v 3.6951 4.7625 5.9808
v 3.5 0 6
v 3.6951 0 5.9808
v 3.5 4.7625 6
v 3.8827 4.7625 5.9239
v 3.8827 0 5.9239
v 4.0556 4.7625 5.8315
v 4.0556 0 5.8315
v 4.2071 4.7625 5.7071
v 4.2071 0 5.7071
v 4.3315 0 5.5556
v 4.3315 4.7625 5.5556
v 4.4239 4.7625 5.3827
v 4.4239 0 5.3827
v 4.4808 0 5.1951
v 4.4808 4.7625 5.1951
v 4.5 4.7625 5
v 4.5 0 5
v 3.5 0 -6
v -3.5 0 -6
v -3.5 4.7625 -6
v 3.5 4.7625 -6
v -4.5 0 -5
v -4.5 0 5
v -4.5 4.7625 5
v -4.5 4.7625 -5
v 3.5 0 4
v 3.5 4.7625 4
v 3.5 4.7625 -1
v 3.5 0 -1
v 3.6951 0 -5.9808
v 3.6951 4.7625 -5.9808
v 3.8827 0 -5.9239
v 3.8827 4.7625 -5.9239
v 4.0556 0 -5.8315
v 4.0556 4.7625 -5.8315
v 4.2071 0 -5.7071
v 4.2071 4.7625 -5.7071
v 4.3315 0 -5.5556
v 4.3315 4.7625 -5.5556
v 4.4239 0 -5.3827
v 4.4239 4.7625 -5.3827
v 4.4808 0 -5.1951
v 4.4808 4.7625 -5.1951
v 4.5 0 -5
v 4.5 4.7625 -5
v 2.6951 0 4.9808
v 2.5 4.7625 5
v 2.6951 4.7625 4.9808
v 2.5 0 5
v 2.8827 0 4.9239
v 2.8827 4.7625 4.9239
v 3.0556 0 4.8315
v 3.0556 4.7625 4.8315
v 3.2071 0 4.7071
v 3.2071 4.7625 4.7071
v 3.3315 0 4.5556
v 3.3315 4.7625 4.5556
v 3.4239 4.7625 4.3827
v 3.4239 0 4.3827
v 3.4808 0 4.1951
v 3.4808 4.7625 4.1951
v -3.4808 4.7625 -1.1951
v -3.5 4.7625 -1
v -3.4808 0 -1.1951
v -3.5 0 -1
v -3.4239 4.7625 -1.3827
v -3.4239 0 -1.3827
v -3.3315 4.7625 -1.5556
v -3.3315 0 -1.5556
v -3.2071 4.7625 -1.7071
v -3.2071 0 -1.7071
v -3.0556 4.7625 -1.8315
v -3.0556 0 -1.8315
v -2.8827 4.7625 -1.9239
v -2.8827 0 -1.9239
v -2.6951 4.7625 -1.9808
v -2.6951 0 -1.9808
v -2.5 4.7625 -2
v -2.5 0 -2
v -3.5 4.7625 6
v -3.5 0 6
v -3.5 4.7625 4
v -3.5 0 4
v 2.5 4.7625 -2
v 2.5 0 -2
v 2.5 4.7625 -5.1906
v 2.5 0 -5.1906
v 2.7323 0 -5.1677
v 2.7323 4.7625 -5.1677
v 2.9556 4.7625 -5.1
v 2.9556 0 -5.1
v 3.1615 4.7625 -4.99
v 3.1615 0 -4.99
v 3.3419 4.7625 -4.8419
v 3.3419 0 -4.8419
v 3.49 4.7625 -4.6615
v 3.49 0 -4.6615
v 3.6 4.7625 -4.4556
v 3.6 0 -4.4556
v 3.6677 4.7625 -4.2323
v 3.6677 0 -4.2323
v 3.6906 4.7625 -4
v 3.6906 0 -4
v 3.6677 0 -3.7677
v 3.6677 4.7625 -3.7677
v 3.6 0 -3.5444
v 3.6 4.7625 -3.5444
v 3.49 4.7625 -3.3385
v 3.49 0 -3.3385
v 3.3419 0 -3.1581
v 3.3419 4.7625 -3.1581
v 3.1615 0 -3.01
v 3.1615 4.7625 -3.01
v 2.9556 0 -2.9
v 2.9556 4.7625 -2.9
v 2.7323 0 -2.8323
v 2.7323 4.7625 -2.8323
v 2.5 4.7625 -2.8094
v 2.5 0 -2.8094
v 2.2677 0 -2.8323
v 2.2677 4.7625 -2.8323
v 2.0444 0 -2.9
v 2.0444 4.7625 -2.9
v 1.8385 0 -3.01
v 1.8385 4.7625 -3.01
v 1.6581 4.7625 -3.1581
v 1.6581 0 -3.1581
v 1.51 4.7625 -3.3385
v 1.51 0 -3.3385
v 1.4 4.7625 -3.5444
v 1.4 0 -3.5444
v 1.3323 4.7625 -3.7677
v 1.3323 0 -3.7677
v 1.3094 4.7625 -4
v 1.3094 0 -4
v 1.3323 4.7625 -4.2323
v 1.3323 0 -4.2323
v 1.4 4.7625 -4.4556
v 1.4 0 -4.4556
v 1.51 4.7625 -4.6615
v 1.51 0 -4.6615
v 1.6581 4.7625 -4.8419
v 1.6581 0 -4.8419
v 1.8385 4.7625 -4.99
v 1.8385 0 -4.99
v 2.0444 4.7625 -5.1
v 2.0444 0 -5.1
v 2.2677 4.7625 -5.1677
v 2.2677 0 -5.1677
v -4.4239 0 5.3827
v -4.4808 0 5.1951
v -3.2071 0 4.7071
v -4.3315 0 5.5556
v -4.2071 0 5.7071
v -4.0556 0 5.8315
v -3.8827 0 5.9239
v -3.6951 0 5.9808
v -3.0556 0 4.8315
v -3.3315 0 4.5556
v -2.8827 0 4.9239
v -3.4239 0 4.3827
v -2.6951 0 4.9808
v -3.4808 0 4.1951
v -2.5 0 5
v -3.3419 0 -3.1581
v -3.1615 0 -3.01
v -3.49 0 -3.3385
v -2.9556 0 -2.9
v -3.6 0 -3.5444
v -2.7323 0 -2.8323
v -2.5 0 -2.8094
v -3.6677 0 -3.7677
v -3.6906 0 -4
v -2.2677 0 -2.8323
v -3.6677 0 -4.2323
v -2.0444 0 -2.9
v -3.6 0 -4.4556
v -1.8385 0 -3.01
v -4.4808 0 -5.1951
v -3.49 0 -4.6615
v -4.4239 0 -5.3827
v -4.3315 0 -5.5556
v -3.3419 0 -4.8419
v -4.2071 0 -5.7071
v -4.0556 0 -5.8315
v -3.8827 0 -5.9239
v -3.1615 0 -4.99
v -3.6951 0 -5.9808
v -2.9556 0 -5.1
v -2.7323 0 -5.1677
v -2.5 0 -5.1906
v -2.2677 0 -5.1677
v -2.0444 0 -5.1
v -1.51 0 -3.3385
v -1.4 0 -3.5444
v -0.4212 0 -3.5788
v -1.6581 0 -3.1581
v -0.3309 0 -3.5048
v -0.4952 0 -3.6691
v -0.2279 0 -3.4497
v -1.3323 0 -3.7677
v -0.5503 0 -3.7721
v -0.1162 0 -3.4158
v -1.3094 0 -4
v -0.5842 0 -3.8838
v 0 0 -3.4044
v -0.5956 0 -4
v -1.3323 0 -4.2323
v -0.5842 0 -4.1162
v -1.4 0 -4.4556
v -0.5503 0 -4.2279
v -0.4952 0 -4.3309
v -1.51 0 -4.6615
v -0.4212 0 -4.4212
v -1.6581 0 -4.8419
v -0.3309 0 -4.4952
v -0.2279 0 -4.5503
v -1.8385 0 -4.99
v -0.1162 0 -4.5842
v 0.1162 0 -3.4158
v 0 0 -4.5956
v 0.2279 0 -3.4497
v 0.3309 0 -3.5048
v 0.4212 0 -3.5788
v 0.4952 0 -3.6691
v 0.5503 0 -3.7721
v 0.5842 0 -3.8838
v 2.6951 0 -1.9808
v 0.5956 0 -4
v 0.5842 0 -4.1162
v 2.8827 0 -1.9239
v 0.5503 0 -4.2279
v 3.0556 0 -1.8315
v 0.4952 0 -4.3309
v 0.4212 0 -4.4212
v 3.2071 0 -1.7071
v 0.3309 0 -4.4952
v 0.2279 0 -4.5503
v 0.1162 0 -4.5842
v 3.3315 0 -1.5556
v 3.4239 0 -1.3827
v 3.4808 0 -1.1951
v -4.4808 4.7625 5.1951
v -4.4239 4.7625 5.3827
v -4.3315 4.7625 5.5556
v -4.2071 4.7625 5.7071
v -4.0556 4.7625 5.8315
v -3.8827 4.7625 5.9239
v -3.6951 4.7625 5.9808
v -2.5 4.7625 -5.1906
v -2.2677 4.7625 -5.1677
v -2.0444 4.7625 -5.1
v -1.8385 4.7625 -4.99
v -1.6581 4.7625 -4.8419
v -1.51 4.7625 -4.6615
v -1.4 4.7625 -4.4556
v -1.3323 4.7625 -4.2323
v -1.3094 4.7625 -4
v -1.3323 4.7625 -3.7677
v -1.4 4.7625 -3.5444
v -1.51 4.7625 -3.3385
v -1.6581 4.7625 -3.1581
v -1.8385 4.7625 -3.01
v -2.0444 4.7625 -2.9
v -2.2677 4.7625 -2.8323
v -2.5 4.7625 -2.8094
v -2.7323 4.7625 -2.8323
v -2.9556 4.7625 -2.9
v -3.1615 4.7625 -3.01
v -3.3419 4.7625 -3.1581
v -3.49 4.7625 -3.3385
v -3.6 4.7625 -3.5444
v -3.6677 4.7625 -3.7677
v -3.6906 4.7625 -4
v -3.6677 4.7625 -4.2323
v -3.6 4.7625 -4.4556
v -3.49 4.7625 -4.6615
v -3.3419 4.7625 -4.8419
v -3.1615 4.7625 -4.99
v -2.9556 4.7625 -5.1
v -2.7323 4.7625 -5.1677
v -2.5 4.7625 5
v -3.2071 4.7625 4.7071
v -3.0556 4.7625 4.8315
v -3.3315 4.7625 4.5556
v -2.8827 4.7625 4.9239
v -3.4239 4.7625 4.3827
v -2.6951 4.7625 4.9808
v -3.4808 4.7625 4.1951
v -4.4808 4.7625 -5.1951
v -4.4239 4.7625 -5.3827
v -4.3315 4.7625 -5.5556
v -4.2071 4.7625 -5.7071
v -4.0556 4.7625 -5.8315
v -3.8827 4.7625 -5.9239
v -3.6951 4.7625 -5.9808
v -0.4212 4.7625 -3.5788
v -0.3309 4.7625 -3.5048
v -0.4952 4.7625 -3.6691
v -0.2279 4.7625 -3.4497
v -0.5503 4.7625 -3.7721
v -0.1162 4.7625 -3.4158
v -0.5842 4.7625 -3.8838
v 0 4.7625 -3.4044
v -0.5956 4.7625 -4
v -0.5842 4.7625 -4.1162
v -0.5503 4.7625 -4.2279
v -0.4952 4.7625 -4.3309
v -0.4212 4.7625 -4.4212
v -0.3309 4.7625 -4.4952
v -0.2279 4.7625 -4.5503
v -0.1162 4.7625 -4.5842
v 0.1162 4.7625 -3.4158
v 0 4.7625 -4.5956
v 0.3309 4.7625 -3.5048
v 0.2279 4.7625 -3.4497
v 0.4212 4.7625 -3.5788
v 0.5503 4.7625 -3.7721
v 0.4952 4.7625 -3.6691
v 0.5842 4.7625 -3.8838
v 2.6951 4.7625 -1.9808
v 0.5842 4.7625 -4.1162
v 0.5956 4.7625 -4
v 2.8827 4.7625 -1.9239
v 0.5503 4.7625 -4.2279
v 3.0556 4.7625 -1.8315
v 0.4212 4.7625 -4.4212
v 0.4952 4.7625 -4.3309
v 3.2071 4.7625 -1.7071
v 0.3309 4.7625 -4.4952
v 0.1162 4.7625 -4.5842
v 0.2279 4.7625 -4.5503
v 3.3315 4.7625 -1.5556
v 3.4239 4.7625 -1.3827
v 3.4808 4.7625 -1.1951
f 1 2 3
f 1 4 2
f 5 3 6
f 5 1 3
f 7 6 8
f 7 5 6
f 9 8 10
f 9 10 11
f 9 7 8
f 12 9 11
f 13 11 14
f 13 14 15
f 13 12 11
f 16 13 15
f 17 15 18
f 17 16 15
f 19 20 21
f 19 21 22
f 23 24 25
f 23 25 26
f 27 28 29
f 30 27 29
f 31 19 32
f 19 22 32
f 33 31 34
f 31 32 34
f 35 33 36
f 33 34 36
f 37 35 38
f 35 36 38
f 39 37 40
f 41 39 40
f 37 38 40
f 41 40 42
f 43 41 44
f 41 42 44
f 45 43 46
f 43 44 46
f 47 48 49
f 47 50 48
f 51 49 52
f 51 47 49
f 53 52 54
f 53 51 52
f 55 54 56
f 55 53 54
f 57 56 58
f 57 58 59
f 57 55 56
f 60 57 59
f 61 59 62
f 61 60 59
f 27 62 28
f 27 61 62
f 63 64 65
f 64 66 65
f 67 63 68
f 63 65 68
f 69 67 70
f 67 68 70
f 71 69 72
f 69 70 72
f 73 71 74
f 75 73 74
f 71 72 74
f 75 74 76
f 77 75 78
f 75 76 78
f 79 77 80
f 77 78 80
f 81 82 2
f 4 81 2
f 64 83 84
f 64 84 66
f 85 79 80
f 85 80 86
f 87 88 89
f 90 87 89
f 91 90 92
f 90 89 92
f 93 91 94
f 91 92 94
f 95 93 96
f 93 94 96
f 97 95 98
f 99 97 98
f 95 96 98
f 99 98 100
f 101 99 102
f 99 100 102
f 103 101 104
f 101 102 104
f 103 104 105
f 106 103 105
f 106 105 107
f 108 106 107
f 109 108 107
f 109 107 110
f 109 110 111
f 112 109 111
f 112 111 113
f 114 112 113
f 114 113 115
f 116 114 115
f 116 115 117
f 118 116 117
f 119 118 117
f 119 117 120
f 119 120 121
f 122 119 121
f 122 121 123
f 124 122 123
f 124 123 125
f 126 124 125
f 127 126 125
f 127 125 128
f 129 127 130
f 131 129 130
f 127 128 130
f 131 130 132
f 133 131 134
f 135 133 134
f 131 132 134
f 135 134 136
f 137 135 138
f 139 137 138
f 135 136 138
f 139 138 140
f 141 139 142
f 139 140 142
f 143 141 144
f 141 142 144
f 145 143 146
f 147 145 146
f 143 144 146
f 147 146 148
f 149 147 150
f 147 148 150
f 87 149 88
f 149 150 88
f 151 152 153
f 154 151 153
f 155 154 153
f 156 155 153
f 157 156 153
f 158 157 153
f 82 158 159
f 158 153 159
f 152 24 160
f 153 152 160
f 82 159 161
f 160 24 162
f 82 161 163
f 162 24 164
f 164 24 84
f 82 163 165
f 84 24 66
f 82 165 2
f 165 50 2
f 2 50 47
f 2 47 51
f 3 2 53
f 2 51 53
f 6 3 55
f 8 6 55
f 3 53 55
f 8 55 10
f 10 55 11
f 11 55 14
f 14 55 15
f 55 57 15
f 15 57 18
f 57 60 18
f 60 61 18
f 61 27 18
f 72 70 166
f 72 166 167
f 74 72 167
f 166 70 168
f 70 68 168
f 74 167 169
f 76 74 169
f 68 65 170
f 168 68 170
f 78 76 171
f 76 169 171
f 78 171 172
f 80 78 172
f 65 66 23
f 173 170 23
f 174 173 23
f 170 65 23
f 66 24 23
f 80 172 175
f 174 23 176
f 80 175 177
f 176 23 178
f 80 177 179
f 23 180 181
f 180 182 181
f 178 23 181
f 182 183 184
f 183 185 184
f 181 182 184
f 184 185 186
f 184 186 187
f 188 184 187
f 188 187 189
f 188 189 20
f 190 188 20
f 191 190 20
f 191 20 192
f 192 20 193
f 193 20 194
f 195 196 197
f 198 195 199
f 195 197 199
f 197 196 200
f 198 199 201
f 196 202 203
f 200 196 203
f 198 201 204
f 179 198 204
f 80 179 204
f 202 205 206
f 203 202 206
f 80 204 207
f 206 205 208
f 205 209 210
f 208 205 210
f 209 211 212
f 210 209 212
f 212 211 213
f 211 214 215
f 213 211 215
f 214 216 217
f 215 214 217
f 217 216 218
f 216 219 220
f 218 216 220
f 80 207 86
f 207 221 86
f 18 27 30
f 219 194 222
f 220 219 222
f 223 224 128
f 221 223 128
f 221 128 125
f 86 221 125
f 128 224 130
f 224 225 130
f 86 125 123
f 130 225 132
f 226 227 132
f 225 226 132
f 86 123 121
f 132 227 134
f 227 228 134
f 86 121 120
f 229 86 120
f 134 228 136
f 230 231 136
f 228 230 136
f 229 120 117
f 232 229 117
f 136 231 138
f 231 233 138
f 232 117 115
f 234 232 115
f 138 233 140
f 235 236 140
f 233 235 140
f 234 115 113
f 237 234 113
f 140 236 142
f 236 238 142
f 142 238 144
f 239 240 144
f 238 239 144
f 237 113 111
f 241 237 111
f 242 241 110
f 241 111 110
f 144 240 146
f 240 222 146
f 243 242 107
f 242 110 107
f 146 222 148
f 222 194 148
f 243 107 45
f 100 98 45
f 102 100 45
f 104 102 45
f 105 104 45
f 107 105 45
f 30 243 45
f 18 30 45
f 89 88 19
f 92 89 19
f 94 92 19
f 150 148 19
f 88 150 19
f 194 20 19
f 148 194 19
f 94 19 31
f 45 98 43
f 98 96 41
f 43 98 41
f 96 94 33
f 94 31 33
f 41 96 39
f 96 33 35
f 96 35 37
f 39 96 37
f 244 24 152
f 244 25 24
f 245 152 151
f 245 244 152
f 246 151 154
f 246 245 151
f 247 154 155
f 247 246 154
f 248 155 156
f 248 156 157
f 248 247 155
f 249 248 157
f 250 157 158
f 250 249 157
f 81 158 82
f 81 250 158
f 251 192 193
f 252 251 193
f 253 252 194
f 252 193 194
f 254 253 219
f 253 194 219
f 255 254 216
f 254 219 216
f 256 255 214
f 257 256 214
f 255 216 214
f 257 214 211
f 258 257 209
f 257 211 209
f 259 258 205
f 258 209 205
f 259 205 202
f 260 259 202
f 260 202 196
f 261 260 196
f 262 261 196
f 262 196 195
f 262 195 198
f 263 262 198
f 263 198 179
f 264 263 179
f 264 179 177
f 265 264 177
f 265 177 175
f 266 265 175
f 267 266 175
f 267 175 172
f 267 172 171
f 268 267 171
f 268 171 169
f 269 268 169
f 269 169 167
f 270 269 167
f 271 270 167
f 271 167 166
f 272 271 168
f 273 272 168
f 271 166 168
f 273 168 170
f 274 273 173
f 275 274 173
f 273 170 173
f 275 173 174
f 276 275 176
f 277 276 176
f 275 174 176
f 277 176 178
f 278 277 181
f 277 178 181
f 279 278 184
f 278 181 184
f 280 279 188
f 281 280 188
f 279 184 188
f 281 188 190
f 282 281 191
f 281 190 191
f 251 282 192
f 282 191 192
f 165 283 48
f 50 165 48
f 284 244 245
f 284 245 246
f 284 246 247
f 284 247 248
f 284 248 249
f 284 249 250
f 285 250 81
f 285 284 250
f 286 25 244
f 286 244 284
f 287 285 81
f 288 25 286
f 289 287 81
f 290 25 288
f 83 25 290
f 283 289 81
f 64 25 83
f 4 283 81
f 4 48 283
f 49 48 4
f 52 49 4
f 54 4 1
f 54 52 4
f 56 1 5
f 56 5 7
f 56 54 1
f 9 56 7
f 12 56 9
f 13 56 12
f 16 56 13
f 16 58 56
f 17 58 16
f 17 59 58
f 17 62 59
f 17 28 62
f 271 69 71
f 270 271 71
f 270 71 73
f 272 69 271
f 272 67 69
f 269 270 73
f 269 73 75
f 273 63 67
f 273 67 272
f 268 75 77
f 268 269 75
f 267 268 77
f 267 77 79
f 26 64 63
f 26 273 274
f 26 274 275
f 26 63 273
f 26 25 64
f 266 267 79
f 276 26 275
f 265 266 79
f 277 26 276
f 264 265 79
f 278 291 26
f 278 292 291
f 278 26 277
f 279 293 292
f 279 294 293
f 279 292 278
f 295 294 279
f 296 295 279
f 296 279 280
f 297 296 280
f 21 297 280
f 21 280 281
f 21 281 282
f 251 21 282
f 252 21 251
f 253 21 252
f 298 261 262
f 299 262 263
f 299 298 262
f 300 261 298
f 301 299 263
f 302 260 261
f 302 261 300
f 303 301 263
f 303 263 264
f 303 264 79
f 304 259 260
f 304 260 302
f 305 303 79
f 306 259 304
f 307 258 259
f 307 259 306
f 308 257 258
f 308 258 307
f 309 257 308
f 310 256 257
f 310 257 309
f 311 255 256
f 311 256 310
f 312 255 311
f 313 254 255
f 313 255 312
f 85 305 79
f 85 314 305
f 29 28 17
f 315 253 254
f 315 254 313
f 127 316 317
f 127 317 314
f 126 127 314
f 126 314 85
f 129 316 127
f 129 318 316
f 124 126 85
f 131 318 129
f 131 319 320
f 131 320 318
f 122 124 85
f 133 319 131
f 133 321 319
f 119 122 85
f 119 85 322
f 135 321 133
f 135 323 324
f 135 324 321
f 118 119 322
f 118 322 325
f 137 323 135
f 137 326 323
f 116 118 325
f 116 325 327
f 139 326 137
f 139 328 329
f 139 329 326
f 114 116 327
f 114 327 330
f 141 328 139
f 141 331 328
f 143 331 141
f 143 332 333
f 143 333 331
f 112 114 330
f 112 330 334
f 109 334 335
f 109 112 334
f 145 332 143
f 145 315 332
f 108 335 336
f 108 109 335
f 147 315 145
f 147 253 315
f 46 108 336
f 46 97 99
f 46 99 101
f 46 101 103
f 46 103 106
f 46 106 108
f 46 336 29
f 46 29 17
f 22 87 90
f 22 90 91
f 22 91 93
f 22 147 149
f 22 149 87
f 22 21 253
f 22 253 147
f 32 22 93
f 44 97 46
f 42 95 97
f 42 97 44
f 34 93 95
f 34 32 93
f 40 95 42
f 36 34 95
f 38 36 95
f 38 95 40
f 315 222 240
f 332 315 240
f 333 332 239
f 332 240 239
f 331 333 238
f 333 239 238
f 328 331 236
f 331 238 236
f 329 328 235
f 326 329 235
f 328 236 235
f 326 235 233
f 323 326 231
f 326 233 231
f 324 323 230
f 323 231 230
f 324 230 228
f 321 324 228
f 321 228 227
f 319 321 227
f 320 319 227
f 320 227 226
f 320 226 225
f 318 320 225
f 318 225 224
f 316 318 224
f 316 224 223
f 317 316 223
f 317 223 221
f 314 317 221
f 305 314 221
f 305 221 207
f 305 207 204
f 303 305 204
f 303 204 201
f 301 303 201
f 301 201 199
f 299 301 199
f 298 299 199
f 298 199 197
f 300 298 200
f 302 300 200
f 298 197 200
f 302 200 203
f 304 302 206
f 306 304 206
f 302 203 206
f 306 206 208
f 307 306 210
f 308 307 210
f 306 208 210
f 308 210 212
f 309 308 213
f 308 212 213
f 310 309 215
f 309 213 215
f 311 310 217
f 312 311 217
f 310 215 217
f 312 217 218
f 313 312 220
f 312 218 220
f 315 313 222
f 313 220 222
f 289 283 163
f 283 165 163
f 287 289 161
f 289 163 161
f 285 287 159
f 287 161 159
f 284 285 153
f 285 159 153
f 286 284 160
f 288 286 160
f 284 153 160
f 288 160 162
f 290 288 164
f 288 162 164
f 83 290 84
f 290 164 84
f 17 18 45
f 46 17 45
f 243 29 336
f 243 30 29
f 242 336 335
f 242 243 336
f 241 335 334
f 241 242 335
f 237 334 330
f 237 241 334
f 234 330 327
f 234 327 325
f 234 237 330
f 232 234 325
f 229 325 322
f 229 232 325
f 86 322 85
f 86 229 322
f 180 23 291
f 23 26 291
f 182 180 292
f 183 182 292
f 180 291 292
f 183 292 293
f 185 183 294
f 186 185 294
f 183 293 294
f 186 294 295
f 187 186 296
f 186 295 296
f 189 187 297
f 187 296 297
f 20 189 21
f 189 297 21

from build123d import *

# Parameters (mm, degrees)
SKETCH1_W                           = 9
SKETCH1_H                           = 12
EXTRUDE1_DEPTH                      = 4.7625
SKETCH2_W                           = 7
SKETCH2_H                           = 7
EXTRUDE2_DEPTH                      = 5.7625
F_0_80_TAPPED_HOLE1_D               = 1.19126
F_3_32_0_09375_DIAMETER_HOLE1_D     = 2.38125
F_3_32_0_09375_DIAMETER_HOLE1_DEPTH = 10
F_3_32_0_09375_DIAMETER_HOLE1_TIP   = 0.715399675
FILLET7_R                           = 1


with BuildPart() as part:
    # Sketch1 → Extrude1 (new body)
    with BuildSketch(Plane(origin=(0, 0, 0), x_dir=(1, 0, 0), z_dir=(0, 1, 0))):
        Rectangle(SKETCH1_W, SKETCH1_H)
    extrude(amount=EXTRUDE1_DEPTH)

    # Sketch2 → Extrude2 (cut, through all)
    with BuildSketch(Plane(origin=(0, 4.7625, 0), x_dir=(1, 0, 0), z_dir=(0, 1, 0))):
        with Locations((0, -1.5)):
            Rectangle(SKETCH2_W, SKETCH2_H)
    extrude(amount=-EXTRUDE2_DEPTH, mode=Mode.SUBTRACT)

    # #0-80 Tapped Hole1 (through all)
    with Locations(Plane(origin=(0, 4.7625, -4), x_dir=(0, 0, 1), z_dir=(0, 1, 0))):
        with Locations((0, 0)):
            Hole(F_0_80_TAPPED_HOLE1_D / 2)

    # 3/32 (0.09375) Diameter Hole1
    with Locations(Plane(origin=(-2.5, 4.7625, -4), x_dir=(0, 0, 1), z_dir=(0, 1, 0))):
        with Locations((0, 0), (0, 5)):
            Hole(F_3_32_0_09375_DIAMETER_HOLE1_D / 2, depth=F_3_32_0_09375_DIAMETER_HOLE1_DEPTH)
            with Locations((0, 0, -(F_3_32_0_09375_DIAMETER_HOLE1_DEPTH + F_3_32_0_09375_DIAMETER_HOLE1_TIP / 2))):  # 118° drill point
                Cone(0, F_3_32_0_09375_DIAMETER_HOLE1_D / 2, F_3_32_0_09375_DIAMETER_HOLE1_TIP, mode=Mode.SUBTRACT)

    # Fillet7
    fillet7_edges = [part.edges().sort_by_distance(p)[0] for p in [
        (-3.5, 2.38125, 5),
        (-3.5, 2.38125, -2),
        (3.5, 2.38125, -2),
        (3.5, 2.38125, 5),
        (-4.5, 2.38125, -6),
        (4.5, 2.38125, -6),
        (4.5, 2.38125, 6),
        (-4.5, 2.38125, 6),
    ]]
    fillet(fillet7_edges, radius=FILLET7_R)


solid = part.part
